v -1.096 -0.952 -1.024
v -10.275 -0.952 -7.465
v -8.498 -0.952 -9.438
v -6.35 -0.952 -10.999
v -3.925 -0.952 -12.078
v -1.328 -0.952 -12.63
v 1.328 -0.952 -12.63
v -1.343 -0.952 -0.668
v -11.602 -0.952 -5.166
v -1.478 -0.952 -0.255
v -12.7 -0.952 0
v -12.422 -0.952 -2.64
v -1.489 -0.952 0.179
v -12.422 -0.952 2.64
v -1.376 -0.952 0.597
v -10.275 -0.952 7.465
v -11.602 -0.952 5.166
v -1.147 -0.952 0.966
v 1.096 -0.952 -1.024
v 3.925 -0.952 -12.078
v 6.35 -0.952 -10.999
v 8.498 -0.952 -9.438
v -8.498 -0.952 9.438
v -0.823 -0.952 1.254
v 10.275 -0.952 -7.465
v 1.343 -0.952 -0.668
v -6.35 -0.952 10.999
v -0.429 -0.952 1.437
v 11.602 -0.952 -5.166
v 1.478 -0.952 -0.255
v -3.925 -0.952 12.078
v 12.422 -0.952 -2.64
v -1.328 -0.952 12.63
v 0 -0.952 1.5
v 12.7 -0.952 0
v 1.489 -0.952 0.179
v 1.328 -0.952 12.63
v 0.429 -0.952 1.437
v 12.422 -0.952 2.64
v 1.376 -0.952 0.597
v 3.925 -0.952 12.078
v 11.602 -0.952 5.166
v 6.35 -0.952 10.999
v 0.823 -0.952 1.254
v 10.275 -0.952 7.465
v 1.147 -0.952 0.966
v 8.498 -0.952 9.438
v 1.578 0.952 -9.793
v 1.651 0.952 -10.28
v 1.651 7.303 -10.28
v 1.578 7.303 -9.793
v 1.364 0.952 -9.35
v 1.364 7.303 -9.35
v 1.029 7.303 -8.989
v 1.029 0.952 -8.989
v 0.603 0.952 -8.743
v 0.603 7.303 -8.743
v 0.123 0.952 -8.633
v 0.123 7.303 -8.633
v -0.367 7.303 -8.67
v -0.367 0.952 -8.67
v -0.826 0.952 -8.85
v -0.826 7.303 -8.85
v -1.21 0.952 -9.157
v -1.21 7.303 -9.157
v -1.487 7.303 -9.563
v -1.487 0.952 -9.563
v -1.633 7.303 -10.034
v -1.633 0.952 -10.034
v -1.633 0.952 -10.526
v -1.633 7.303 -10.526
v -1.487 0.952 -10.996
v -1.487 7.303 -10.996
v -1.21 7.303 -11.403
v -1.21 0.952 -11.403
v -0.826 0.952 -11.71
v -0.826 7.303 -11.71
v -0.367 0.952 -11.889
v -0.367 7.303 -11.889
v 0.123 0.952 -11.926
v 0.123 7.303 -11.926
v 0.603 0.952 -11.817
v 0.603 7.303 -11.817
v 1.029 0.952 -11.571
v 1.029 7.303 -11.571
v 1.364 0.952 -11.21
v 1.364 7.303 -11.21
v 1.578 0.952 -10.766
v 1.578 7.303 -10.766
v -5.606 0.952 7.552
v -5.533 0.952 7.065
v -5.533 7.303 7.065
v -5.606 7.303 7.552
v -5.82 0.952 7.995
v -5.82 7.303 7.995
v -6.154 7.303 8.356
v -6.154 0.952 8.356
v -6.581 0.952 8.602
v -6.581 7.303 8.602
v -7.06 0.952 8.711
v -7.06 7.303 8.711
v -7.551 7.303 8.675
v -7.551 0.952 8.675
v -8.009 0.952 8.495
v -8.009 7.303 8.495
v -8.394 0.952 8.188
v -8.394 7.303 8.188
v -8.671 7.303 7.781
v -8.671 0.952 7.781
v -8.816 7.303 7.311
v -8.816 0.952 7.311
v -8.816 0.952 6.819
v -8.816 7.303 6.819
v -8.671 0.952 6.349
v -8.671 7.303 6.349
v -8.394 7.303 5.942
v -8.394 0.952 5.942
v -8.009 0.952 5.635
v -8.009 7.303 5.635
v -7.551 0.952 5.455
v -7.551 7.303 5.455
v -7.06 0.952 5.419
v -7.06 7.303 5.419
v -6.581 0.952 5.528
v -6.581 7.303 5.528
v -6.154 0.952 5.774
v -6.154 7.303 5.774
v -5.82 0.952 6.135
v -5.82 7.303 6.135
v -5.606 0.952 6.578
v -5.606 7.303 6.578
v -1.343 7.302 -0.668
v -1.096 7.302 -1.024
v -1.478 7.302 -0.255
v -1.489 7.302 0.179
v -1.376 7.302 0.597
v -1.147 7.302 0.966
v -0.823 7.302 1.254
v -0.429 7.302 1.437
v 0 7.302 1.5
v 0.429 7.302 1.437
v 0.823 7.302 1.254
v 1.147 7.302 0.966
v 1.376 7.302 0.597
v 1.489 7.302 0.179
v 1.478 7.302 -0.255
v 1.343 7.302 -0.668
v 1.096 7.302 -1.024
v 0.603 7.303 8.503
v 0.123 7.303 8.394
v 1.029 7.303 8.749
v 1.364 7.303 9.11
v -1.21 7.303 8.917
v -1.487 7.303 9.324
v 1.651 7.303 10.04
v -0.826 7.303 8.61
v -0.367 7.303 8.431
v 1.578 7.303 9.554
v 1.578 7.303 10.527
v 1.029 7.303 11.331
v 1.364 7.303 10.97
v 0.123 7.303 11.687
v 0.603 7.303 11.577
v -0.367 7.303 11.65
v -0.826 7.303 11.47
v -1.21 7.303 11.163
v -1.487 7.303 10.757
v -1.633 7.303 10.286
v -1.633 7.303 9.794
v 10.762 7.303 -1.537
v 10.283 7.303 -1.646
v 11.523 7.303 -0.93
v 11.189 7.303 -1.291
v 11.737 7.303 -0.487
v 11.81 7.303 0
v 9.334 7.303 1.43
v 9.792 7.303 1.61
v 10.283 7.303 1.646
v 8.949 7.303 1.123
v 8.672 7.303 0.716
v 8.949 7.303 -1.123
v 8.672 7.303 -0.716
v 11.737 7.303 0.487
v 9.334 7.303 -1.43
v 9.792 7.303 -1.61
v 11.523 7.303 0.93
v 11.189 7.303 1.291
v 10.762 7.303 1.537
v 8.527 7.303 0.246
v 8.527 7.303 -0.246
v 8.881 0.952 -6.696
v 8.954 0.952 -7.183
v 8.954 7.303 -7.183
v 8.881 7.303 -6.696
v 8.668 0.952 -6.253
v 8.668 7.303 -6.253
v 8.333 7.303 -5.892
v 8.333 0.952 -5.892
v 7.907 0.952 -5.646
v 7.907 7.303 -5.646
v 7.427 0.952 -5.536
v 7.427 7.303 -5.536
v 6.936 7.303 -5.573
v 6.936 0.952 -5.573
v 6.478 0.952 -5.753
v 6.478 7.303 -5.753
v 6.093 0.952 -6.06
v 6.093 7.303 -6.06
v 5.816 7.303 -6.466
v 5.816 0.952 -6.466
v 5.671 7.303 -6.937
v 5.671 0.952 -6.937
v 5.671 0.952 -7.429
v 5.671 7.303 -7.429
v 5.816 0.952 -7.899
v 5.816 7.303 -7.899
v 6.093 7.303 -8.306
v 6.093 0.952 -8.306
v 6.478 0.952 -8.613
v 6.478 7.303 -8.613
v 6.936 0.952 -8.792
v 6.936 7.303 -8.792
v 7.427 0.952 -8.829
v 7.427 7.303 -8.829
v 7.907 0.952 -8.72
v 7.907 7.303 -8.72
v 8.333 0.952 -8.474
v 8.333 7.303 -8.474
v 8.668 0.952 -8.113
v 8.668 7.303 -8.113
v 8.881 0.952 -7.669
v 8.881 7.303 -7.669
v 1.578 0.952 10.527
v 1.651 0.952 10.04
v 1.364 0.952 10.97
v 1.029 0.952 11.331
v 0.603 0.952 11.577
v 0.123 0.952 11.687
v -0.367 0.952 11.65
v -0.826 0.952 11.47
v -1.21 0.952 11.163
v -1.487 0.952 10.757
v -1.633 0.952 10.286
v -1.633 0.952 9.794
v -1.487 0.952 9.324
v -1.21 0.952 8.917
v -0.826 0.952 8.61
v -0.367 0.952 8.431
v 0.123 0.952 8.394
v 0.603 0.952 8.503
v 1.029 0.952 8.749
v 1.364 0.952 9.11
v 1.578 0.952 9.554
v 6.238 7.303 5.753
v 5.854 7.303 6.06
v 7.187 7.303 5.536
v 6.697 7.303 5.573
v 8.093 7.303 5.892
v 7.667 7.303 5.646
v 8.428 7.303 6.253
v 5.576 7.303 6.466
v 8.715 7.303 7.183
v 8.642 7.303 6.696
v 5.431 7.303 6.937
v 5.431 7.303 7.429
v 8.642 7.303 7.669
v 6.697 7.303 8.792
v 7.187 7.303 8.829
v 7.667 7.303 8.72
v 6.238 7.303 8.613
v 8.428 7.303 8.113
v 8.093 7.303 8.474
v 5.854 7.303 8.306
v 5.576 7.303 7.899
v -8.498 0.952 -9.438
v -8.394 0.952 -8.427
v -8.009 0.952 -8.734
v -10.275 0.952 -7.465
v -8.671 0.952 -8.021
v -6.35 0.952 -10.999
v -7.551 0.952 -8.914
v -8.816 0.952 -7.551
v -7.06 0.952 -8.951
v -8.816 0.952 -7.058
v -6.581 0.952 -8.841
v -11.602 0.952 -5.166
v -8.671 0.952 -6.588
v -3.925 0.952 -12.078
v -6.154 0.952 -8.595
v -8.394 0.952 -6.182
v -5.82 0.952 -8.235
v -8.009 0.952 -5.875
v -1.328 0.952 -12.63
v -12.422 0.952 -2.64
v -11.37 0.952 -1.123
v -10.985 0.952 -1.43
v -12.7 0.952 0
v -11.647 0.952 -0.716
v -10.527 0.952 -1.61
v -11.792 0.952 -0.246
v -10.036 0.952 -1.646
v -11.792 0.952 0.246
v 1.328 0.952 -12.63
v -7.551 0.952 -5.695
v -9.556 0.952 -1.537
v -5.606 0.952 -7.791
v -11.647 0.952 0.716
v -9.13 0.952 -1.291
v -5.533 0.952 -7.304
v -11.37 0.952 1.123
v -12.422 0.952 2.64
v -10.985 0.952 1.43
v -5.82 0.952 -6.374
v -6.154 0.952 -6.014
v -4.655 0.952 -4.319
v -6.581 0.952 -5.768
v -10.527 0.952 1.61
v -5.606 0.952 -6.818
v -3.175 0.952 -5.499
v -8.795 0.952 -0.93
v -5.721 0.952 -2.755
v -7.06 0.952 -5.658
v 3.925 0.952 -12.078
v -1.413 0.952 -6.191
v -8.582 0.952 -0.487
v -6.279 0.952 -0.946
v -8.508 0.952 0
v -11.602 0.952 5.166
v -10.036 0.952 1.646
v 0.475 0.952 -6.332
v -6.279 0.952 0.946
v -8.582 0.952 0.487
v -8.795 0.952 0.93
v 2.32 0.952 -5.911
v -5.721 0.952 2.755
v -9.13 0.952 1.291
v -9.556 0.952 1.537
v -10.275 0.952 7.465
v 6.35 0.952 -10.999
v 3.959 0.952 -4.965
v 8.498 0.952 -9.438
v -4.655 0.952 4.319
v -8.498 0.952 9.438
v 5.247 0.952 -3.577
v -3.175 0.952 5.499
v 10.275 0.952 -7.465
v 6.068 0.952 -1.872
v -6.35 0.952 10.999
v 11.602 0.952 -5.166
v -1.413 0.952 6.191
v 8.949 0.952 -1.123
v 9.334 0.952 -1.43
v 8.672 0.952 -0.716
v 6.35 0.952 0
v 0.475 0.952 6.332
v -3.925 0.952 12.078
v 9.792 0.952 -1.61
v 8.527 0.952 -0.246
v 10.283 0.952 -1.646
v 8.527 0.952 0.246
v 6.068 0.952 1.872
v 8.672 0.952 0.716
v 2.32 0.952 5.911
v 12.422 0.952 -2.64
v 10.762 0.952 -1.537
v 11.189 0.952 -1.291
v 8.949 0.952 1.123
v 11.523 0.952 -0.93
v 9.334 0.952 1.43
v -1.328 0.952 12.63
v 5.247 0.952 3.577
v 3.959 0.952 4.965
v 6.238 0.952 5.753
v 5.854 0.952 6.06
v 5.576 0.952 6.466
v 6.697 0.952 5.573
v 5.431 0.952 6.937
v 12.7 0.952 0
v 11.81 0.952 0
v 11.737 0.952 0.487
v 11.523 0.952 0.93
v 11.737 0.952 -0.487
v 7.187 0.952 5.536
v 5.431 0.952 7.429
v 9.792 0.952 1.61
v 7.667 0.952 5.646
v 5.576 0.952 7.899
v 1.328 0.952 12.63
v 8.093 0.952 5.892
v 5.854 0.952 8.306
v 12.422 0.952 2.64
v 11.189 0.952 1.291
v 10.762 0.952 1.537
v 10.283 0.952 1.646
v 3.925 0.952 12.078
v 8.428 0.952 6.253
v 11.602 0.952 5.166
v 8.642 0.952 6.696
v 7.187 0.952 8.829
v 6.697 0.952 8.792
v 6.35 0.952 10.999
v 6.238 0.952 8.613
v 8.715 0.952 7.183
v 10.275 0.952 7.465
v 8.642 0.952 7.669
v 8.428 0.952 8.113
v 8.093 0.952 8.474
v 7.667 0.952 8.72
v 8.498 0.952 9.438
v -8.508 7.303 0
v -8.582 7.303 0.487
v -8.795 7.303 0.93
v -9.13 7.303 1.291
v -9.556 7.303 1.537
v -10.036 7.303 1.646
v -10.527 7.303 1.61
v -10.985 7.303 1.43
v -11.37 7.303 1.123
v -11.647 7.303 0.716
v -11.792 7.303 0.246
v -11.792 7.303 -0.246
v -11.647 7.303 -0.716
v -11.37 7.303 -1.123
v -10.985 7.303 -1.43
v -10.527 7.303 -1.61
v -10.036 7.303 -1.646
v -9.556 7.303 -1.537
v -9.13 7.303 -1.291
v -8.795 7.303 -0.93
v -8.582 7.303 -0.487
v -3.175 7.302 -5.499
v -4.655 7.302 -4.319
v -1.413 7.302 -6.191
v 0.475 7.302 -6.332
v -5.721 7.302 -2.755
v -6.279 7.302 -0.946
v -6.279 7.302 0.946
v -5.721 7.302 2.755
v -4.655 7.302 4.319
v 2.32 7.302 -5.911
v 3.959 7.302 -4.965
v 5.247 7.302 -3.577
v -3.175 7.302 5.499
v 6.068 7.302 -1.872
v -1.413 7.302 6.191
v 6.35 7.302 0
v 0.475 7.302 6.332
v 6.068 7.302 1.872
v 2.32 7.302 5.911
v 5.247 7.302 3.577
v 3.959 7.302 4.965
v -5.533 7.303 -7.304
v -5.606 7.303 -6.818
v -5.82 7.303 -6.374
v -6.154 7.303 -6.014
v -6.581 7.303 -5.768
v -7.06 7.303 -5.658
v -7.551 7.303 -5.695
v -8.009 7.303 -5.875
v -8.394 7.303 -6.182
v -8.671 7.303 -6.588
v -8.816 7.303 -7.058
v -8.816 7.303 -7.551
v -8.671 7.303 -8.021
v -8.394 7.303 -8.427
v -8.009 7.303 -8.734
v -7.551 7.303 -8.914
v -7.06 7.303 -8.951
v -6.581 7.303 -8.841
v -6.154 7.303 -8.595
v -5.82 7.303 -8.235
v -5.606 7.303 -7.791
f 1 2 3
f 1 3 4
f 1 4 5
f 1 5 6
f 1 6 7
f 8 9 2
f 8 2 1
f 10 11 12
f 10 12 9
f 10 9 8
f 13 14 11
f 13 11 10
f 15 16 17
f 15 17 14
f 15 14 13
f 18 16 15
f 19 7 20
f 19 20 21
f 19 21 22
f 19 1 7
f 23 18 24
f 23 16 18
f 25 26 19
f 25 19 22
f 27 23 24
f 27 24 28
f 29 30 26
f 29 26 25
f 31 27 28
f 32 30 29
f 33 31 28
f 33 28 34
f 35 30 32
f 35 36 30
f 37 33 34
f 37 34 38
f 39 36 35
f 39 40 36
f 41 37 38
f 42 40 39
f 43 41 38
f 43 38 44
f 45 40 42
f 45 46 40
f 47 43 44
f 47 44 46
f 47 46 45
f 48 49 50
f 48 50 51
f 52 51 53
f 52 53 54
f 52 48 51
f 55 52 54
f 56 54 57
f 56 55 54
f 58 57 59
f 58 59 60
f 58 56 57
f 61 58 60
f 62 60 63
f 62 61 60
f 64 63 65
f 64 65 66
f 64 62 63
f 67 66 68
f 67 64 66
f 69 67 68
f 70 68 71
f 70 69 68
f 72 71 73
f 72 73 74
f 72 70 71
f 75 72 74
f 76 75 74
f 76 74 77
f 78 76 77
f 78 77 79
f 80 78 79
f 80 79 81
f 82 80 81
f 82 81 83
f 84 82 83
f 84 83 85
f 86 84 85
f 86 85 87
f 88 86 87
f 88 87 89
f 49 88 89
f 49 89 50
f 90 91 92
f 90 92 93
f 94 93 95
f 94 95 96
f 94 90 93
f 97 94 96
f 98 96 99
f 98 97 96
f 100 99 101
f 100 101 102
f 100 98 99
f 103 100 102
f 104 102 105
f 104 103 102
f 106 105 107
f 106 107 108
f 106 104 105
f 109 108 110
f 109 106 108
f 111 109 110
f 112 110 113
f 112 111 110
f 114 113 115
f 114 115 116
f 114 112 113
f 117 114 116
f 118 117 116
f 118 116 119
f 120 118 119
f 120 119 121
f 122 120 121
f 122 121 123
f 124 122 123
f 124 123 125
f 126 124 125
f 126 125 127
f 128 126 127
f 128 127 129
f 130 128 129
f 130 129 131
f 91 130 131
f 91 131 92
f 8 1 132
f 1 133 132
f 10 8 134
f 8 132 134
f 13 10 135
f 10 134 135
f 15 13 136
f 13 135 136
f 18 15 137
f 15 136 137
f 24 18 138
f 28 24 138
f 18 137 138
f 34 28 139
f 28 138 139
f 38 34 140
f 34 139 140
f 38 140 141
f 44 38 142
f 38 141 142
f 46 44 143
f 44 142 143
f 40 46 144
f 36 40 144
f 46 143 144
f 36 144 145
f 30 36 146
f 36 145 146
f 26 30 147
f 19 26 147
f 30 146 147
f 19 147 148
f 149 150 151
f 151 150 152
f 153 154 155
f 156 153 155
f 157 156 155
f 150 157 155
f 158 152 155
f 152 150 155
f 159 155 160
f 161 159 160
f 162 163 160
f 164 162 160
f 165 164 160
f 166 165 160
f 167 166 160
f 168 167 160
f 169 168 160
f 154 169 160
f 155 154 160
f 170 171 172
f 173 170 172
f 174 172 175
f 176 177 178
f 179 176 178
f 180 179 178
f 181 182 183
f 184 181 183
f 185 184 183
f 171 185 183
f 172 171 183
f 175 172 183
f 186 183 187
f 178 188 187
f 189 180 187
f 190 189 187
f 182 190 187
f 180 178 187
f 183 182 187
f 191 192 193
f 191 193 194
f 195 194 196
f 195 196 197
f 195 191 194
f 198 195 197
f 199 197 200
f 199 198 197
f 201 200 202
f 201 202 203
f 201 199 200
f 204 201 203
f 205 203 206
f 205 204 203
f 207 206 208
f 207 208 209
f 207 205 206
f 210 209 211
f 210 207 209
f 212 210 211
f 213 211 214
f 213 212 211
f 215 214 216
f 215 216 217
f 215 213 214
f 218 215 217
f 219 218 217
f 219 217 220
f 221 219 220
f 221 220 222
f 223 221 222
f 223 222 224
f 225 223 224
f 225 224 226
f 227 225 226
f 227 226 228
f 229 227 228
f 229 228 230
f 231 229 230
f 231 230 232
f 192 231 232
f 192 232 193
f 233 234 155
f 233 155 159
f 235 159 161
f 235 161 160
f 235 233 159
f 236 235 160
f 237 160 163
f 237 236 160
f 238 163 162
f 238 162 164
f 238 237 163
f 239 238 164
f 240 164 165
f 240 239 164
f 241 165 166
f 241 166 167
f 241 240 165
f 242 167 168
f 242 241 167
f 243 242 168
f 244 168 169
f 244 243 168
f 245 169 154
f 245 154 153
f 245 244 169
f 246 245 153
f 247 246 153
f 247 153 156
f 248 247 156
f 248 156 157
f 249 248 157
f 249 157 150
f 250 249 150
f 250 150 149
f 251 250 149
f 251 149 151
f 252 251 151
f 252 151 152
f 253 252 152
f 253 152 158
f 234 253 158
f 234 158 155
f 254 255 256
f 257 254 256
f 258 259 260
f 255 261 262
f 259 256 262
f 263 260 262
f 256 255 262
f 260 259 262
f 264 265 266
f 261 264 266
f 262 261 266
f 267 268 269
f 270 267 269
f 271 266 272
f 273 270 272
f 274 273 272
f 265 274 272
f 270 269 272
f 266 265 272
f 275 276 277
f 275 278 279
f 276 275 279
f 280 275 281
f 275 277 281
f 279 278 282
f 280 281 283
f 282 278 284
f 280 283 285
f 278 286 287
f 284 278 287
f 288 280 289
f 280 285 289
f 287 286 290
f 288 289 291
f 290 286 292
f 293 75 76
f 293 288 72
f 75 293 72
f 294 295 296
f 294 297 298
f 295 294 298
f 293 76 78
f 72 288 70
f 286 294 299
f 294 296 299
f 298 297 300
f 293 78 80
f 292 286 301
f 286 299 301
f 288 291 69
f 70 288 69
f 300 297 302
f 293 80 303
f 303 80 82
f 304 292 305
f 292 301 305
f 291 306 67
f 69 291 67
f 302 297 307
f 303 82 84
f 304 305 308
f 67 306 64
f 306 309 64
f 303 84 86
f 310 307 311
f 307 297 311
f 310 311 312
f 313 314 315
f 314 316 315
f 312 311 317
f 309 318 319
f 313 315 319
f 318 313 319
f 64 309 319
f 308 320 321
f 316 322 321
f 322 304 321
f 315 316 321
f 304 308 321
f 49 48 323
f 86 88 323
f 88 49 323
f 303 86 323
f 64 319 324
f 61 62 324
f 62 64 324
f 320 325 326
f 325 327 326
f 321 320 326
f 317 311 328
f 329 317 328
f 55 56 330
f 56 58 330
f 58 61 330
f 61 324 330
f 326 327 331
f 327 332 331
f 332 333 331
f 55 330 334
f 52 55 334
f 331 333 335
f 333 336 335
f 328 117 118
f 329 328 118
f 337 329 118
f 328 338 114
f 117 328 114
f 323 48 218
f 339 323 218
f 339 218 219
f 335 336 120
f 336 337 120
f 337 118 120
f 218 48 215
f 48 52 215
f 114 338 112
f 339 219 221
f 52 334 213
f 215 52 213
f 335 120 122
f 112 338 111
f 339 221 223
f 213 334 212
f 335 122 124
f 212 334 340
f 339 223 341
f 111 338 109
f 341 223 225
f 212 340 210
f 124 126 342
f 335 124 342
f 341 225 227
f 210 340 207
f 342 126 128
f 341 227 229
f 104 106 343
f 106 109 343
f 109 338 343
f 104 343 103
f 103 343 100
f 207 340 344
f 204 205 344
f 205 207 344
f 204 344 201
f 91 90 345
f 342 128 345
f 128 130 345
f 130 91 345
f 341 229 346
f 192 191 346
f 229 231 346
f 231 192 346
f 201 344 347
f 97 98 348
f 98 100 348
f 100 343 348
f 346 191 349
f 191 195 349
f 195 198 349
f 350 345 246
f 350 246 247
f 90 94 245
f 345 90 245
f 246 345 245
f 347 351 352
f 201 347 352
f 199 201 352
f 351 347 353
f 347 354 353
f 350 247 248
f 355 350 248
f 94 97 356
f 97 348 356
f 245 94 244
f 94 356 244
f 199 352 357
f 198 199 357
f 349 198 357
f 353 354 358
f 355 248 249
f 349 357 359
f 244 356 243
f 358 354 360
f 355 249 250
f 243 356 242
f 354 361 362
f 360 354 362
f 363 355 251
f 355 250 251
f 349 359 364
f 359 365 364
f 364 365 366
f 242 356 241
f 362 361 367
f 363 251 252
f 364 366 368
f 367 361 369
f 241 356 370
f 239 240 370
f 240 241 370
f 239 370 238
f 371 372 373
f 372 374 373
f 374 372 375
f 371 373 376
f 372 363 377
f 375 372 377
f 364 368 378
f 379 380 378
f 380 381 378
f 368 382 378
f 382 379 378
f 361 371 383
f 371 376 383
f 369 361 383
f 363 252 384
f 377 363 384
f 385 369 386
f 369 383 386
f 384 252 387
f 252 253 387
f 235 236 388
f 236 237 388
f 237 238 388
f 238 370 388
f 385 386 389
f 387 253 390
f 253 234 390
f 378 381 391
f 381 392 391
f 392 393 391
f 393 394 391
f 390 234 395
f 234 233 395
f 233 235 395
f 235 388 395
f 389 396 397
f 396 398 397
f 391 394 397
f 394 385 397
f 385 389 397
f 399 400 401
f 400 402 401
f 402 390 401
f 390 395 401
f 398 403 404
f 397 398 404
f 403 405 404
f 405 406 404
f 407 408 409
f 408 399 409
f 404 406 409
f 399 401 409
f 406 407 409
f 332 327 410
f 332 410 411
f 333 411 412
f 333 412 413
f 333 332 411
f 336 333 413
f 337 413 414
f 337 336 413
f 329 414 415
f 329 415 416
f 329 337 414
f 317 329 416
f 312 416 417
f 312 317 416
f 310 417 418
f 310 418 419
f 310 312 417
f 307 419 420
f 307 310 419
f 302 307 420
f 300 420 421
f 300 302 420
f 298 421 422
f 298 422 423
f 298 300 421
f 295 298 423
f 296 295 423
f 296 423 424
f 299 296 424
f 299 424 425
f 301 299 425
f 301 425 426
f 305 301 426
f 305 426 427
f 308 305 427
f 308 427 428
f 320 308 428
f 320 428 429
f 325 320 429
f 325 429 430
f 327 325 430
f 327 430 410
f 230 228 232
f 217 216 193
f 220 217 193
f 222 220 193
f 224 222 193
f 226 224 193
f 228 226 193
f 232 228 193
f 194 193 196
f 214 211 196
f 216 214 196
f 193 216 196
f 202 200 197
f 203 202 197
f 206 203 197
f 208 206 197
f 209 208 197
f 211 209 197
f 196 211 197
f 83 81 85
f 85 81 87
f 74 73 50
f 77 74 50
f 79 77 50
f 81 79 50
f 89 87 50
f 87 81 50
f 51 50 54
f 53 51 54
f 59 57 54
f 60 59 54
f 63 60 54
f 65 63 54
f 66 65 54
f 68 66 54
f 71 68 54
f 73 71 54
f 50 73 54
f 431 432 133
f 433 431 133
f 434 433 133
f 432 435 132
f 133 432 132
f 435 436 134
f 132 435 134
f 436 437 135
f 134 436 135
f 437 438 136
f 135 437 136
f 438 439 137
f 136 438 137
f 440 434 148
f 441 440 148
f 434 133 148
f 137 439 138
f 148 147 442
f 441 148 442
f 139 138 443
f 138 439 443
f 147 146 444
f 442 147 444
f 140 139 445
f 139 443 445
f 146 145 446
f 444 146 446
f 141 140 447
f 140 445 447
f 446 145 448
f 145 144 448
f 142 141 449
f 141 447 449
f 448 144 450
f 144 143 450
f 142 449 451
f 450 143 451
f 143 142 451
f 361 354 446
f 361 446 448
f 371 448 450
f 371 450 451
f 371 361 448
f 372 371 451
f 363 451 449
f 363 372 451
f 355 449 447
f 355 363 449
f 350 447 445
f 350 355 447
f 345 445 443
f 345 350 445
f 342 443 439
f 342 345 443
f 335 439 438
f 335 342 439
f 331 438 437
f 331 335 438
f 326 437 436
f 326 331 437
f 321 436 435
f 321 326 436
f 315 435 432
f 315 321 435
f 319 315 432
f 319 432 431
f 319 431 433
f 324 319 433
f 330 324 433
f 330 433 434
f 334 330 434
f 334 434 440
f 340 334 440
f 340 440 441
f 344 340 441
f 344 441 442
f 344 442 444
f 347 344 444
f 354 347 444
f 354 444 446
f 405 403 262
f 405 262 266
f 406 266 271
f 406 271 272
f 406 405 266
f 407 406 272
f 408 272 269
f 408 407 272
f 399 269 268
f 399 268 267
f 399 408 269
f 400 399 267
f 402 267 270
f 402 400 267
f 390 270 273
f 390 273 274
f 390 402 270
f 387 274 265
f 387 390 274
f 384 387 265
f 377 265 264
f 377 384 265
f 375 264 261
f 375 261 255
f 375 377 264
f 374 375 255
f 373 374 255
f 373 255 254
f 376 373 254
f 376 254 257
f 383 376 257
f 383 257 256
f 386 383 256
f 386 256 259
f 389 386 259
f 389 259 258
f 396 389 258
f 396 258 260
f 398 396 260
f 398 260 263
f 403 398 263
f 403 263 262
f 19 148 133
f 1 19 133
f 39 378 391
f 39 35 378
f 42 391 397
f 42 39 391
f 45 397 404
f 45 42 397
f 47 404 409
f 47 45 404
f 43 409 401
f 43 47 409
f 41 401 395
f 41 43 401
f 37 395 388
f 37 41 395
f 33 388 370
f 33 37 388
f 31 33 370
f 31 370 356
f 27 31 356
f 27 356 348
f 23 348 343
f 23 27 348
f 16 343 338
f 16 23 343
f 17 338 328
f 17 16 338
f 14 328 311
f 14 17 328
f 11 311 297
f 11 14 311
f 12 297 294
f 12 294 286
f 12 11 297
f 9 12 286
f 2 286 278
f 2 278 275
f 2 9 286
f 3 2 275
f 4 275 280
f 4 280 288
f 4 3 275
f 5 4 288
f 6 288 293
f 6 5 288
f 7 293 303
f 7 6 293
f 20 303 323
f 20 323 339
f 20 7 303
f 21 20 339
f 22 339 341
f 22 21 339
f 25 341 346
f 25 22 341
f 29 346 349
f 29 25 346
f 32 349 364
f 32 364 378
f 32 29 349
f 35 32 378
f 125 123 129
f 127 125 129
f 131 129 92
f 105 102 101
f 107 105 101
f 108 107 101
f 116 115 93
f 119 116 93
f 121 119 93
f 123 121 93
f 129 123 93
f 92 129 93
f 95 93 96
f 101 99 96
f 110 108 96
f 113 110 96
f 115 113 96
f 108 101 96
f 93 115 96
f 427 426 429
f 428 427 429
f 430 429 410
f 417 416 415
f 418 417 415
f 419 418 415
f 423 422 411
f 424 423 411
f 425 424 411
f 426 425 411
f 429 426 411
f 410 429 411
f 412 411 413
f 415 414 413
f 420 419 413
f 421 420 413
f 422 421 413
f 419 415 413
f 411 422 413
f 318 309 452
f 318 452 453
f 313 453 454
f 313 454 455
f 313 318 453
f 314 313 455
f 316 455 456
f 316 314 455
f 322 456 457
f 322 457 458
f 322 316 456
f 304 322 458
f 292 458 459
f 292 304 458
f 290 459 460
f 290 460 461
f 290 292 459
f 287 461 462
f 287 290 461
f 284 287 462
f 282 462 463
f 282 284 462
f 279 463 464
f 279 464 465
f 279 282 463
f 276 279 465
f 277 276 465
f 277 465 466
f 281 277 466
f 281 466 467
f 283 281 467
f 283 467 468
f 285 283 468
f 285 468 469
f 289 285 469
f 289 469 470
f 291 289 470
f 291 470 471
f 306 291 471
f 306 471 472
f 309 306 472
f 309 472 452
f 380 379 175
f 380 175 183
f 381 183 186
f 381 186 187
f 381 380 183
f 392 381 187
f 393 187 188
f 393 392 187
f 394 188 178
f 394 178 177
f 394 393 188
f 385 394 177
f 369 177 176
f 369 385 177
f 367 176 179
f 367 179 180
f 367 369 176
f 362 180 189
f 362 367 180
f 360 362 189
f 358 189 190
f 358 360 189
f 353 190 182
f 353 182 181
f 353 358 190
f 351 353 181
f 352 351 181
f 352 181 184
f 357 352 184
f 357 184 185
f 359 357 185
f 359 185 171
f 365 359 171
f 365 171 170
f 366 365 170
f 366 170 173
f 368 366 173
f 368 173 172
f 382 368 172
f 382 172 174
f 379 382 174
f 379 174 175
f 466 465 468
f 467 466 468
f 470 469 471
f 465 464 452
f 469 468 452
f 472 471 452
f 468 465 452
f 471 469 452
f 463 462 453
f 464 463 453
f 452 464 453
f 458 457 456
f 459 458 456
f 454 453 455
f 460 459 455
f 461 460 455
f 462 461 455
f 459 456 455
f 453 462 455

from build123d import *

# Parameters (mm, degrees)
F0_R          = 12.7
F0_R_2        = 6.35
F1_DEPTH      = 0.9525
F2_DEPTH      = 7.3025
F2_DEPTH_BACK = 0.9525
F3_R          = 1.651
F4_DEPTH      = 8.255


with BuildPart() as f1:
    # F0 (on Front) → F1 (new body, symmetric)
    with BuildSketch(Plane.XZ):
        Circle(F0_R)
        Circle(F0_R_2, mode=Mode.SUBTRACT)
    extrude(amount=F1_DEPTH, both=True)

    # F0 (on Front) → F2 (join, two sides)
    with BuildSketch(Plane.XZ) as f2_sk:
        Circle(F0_R_2)
        with BuildLine():
            ThreePointArc((-1.09601, -1.0240908553), (0, 1.5), (1.09601, -1.0240908553))
            Line((1.09601, -1.0240908553), (-1.09601, -1.0240908553))
        make_face(mode=Mode.SUBTRACT)
    extrude(amount=-F2_DEPTH)
    extrude(f2_sk.sketch, amount=F2_DEPTH_BACK)

    # F3 (on face) → F4 (join)
    with BuildSketch(Plane.XZ.offset(0.9525)):
        with Locations((0, 10.0402068998)):
            Circle(F3_R)
        with Locations((7.063929059, 7.1827068998)):
            Circle(F3_R)
        with Locations((7.3034819544, -7.1827068998)):
            Circle(F3_R)
        with Locations((0, -10.2797931002)):
            Circle(F3_R)
        with Locations((10.1592937556, 0)):
            Circle(F3_R)
        with Locations((-7.1837055067, 7.0649111522)):
            Circle(F3_R)
        with Locations((-10.1592937556, 0)):
            Circle(F3_R)
        with Locations((-7.1837055067, -7.3044973525)):
            Circle(F3_R)
    extrude(amount=-F4_DEPTH)


solid = f1.part
